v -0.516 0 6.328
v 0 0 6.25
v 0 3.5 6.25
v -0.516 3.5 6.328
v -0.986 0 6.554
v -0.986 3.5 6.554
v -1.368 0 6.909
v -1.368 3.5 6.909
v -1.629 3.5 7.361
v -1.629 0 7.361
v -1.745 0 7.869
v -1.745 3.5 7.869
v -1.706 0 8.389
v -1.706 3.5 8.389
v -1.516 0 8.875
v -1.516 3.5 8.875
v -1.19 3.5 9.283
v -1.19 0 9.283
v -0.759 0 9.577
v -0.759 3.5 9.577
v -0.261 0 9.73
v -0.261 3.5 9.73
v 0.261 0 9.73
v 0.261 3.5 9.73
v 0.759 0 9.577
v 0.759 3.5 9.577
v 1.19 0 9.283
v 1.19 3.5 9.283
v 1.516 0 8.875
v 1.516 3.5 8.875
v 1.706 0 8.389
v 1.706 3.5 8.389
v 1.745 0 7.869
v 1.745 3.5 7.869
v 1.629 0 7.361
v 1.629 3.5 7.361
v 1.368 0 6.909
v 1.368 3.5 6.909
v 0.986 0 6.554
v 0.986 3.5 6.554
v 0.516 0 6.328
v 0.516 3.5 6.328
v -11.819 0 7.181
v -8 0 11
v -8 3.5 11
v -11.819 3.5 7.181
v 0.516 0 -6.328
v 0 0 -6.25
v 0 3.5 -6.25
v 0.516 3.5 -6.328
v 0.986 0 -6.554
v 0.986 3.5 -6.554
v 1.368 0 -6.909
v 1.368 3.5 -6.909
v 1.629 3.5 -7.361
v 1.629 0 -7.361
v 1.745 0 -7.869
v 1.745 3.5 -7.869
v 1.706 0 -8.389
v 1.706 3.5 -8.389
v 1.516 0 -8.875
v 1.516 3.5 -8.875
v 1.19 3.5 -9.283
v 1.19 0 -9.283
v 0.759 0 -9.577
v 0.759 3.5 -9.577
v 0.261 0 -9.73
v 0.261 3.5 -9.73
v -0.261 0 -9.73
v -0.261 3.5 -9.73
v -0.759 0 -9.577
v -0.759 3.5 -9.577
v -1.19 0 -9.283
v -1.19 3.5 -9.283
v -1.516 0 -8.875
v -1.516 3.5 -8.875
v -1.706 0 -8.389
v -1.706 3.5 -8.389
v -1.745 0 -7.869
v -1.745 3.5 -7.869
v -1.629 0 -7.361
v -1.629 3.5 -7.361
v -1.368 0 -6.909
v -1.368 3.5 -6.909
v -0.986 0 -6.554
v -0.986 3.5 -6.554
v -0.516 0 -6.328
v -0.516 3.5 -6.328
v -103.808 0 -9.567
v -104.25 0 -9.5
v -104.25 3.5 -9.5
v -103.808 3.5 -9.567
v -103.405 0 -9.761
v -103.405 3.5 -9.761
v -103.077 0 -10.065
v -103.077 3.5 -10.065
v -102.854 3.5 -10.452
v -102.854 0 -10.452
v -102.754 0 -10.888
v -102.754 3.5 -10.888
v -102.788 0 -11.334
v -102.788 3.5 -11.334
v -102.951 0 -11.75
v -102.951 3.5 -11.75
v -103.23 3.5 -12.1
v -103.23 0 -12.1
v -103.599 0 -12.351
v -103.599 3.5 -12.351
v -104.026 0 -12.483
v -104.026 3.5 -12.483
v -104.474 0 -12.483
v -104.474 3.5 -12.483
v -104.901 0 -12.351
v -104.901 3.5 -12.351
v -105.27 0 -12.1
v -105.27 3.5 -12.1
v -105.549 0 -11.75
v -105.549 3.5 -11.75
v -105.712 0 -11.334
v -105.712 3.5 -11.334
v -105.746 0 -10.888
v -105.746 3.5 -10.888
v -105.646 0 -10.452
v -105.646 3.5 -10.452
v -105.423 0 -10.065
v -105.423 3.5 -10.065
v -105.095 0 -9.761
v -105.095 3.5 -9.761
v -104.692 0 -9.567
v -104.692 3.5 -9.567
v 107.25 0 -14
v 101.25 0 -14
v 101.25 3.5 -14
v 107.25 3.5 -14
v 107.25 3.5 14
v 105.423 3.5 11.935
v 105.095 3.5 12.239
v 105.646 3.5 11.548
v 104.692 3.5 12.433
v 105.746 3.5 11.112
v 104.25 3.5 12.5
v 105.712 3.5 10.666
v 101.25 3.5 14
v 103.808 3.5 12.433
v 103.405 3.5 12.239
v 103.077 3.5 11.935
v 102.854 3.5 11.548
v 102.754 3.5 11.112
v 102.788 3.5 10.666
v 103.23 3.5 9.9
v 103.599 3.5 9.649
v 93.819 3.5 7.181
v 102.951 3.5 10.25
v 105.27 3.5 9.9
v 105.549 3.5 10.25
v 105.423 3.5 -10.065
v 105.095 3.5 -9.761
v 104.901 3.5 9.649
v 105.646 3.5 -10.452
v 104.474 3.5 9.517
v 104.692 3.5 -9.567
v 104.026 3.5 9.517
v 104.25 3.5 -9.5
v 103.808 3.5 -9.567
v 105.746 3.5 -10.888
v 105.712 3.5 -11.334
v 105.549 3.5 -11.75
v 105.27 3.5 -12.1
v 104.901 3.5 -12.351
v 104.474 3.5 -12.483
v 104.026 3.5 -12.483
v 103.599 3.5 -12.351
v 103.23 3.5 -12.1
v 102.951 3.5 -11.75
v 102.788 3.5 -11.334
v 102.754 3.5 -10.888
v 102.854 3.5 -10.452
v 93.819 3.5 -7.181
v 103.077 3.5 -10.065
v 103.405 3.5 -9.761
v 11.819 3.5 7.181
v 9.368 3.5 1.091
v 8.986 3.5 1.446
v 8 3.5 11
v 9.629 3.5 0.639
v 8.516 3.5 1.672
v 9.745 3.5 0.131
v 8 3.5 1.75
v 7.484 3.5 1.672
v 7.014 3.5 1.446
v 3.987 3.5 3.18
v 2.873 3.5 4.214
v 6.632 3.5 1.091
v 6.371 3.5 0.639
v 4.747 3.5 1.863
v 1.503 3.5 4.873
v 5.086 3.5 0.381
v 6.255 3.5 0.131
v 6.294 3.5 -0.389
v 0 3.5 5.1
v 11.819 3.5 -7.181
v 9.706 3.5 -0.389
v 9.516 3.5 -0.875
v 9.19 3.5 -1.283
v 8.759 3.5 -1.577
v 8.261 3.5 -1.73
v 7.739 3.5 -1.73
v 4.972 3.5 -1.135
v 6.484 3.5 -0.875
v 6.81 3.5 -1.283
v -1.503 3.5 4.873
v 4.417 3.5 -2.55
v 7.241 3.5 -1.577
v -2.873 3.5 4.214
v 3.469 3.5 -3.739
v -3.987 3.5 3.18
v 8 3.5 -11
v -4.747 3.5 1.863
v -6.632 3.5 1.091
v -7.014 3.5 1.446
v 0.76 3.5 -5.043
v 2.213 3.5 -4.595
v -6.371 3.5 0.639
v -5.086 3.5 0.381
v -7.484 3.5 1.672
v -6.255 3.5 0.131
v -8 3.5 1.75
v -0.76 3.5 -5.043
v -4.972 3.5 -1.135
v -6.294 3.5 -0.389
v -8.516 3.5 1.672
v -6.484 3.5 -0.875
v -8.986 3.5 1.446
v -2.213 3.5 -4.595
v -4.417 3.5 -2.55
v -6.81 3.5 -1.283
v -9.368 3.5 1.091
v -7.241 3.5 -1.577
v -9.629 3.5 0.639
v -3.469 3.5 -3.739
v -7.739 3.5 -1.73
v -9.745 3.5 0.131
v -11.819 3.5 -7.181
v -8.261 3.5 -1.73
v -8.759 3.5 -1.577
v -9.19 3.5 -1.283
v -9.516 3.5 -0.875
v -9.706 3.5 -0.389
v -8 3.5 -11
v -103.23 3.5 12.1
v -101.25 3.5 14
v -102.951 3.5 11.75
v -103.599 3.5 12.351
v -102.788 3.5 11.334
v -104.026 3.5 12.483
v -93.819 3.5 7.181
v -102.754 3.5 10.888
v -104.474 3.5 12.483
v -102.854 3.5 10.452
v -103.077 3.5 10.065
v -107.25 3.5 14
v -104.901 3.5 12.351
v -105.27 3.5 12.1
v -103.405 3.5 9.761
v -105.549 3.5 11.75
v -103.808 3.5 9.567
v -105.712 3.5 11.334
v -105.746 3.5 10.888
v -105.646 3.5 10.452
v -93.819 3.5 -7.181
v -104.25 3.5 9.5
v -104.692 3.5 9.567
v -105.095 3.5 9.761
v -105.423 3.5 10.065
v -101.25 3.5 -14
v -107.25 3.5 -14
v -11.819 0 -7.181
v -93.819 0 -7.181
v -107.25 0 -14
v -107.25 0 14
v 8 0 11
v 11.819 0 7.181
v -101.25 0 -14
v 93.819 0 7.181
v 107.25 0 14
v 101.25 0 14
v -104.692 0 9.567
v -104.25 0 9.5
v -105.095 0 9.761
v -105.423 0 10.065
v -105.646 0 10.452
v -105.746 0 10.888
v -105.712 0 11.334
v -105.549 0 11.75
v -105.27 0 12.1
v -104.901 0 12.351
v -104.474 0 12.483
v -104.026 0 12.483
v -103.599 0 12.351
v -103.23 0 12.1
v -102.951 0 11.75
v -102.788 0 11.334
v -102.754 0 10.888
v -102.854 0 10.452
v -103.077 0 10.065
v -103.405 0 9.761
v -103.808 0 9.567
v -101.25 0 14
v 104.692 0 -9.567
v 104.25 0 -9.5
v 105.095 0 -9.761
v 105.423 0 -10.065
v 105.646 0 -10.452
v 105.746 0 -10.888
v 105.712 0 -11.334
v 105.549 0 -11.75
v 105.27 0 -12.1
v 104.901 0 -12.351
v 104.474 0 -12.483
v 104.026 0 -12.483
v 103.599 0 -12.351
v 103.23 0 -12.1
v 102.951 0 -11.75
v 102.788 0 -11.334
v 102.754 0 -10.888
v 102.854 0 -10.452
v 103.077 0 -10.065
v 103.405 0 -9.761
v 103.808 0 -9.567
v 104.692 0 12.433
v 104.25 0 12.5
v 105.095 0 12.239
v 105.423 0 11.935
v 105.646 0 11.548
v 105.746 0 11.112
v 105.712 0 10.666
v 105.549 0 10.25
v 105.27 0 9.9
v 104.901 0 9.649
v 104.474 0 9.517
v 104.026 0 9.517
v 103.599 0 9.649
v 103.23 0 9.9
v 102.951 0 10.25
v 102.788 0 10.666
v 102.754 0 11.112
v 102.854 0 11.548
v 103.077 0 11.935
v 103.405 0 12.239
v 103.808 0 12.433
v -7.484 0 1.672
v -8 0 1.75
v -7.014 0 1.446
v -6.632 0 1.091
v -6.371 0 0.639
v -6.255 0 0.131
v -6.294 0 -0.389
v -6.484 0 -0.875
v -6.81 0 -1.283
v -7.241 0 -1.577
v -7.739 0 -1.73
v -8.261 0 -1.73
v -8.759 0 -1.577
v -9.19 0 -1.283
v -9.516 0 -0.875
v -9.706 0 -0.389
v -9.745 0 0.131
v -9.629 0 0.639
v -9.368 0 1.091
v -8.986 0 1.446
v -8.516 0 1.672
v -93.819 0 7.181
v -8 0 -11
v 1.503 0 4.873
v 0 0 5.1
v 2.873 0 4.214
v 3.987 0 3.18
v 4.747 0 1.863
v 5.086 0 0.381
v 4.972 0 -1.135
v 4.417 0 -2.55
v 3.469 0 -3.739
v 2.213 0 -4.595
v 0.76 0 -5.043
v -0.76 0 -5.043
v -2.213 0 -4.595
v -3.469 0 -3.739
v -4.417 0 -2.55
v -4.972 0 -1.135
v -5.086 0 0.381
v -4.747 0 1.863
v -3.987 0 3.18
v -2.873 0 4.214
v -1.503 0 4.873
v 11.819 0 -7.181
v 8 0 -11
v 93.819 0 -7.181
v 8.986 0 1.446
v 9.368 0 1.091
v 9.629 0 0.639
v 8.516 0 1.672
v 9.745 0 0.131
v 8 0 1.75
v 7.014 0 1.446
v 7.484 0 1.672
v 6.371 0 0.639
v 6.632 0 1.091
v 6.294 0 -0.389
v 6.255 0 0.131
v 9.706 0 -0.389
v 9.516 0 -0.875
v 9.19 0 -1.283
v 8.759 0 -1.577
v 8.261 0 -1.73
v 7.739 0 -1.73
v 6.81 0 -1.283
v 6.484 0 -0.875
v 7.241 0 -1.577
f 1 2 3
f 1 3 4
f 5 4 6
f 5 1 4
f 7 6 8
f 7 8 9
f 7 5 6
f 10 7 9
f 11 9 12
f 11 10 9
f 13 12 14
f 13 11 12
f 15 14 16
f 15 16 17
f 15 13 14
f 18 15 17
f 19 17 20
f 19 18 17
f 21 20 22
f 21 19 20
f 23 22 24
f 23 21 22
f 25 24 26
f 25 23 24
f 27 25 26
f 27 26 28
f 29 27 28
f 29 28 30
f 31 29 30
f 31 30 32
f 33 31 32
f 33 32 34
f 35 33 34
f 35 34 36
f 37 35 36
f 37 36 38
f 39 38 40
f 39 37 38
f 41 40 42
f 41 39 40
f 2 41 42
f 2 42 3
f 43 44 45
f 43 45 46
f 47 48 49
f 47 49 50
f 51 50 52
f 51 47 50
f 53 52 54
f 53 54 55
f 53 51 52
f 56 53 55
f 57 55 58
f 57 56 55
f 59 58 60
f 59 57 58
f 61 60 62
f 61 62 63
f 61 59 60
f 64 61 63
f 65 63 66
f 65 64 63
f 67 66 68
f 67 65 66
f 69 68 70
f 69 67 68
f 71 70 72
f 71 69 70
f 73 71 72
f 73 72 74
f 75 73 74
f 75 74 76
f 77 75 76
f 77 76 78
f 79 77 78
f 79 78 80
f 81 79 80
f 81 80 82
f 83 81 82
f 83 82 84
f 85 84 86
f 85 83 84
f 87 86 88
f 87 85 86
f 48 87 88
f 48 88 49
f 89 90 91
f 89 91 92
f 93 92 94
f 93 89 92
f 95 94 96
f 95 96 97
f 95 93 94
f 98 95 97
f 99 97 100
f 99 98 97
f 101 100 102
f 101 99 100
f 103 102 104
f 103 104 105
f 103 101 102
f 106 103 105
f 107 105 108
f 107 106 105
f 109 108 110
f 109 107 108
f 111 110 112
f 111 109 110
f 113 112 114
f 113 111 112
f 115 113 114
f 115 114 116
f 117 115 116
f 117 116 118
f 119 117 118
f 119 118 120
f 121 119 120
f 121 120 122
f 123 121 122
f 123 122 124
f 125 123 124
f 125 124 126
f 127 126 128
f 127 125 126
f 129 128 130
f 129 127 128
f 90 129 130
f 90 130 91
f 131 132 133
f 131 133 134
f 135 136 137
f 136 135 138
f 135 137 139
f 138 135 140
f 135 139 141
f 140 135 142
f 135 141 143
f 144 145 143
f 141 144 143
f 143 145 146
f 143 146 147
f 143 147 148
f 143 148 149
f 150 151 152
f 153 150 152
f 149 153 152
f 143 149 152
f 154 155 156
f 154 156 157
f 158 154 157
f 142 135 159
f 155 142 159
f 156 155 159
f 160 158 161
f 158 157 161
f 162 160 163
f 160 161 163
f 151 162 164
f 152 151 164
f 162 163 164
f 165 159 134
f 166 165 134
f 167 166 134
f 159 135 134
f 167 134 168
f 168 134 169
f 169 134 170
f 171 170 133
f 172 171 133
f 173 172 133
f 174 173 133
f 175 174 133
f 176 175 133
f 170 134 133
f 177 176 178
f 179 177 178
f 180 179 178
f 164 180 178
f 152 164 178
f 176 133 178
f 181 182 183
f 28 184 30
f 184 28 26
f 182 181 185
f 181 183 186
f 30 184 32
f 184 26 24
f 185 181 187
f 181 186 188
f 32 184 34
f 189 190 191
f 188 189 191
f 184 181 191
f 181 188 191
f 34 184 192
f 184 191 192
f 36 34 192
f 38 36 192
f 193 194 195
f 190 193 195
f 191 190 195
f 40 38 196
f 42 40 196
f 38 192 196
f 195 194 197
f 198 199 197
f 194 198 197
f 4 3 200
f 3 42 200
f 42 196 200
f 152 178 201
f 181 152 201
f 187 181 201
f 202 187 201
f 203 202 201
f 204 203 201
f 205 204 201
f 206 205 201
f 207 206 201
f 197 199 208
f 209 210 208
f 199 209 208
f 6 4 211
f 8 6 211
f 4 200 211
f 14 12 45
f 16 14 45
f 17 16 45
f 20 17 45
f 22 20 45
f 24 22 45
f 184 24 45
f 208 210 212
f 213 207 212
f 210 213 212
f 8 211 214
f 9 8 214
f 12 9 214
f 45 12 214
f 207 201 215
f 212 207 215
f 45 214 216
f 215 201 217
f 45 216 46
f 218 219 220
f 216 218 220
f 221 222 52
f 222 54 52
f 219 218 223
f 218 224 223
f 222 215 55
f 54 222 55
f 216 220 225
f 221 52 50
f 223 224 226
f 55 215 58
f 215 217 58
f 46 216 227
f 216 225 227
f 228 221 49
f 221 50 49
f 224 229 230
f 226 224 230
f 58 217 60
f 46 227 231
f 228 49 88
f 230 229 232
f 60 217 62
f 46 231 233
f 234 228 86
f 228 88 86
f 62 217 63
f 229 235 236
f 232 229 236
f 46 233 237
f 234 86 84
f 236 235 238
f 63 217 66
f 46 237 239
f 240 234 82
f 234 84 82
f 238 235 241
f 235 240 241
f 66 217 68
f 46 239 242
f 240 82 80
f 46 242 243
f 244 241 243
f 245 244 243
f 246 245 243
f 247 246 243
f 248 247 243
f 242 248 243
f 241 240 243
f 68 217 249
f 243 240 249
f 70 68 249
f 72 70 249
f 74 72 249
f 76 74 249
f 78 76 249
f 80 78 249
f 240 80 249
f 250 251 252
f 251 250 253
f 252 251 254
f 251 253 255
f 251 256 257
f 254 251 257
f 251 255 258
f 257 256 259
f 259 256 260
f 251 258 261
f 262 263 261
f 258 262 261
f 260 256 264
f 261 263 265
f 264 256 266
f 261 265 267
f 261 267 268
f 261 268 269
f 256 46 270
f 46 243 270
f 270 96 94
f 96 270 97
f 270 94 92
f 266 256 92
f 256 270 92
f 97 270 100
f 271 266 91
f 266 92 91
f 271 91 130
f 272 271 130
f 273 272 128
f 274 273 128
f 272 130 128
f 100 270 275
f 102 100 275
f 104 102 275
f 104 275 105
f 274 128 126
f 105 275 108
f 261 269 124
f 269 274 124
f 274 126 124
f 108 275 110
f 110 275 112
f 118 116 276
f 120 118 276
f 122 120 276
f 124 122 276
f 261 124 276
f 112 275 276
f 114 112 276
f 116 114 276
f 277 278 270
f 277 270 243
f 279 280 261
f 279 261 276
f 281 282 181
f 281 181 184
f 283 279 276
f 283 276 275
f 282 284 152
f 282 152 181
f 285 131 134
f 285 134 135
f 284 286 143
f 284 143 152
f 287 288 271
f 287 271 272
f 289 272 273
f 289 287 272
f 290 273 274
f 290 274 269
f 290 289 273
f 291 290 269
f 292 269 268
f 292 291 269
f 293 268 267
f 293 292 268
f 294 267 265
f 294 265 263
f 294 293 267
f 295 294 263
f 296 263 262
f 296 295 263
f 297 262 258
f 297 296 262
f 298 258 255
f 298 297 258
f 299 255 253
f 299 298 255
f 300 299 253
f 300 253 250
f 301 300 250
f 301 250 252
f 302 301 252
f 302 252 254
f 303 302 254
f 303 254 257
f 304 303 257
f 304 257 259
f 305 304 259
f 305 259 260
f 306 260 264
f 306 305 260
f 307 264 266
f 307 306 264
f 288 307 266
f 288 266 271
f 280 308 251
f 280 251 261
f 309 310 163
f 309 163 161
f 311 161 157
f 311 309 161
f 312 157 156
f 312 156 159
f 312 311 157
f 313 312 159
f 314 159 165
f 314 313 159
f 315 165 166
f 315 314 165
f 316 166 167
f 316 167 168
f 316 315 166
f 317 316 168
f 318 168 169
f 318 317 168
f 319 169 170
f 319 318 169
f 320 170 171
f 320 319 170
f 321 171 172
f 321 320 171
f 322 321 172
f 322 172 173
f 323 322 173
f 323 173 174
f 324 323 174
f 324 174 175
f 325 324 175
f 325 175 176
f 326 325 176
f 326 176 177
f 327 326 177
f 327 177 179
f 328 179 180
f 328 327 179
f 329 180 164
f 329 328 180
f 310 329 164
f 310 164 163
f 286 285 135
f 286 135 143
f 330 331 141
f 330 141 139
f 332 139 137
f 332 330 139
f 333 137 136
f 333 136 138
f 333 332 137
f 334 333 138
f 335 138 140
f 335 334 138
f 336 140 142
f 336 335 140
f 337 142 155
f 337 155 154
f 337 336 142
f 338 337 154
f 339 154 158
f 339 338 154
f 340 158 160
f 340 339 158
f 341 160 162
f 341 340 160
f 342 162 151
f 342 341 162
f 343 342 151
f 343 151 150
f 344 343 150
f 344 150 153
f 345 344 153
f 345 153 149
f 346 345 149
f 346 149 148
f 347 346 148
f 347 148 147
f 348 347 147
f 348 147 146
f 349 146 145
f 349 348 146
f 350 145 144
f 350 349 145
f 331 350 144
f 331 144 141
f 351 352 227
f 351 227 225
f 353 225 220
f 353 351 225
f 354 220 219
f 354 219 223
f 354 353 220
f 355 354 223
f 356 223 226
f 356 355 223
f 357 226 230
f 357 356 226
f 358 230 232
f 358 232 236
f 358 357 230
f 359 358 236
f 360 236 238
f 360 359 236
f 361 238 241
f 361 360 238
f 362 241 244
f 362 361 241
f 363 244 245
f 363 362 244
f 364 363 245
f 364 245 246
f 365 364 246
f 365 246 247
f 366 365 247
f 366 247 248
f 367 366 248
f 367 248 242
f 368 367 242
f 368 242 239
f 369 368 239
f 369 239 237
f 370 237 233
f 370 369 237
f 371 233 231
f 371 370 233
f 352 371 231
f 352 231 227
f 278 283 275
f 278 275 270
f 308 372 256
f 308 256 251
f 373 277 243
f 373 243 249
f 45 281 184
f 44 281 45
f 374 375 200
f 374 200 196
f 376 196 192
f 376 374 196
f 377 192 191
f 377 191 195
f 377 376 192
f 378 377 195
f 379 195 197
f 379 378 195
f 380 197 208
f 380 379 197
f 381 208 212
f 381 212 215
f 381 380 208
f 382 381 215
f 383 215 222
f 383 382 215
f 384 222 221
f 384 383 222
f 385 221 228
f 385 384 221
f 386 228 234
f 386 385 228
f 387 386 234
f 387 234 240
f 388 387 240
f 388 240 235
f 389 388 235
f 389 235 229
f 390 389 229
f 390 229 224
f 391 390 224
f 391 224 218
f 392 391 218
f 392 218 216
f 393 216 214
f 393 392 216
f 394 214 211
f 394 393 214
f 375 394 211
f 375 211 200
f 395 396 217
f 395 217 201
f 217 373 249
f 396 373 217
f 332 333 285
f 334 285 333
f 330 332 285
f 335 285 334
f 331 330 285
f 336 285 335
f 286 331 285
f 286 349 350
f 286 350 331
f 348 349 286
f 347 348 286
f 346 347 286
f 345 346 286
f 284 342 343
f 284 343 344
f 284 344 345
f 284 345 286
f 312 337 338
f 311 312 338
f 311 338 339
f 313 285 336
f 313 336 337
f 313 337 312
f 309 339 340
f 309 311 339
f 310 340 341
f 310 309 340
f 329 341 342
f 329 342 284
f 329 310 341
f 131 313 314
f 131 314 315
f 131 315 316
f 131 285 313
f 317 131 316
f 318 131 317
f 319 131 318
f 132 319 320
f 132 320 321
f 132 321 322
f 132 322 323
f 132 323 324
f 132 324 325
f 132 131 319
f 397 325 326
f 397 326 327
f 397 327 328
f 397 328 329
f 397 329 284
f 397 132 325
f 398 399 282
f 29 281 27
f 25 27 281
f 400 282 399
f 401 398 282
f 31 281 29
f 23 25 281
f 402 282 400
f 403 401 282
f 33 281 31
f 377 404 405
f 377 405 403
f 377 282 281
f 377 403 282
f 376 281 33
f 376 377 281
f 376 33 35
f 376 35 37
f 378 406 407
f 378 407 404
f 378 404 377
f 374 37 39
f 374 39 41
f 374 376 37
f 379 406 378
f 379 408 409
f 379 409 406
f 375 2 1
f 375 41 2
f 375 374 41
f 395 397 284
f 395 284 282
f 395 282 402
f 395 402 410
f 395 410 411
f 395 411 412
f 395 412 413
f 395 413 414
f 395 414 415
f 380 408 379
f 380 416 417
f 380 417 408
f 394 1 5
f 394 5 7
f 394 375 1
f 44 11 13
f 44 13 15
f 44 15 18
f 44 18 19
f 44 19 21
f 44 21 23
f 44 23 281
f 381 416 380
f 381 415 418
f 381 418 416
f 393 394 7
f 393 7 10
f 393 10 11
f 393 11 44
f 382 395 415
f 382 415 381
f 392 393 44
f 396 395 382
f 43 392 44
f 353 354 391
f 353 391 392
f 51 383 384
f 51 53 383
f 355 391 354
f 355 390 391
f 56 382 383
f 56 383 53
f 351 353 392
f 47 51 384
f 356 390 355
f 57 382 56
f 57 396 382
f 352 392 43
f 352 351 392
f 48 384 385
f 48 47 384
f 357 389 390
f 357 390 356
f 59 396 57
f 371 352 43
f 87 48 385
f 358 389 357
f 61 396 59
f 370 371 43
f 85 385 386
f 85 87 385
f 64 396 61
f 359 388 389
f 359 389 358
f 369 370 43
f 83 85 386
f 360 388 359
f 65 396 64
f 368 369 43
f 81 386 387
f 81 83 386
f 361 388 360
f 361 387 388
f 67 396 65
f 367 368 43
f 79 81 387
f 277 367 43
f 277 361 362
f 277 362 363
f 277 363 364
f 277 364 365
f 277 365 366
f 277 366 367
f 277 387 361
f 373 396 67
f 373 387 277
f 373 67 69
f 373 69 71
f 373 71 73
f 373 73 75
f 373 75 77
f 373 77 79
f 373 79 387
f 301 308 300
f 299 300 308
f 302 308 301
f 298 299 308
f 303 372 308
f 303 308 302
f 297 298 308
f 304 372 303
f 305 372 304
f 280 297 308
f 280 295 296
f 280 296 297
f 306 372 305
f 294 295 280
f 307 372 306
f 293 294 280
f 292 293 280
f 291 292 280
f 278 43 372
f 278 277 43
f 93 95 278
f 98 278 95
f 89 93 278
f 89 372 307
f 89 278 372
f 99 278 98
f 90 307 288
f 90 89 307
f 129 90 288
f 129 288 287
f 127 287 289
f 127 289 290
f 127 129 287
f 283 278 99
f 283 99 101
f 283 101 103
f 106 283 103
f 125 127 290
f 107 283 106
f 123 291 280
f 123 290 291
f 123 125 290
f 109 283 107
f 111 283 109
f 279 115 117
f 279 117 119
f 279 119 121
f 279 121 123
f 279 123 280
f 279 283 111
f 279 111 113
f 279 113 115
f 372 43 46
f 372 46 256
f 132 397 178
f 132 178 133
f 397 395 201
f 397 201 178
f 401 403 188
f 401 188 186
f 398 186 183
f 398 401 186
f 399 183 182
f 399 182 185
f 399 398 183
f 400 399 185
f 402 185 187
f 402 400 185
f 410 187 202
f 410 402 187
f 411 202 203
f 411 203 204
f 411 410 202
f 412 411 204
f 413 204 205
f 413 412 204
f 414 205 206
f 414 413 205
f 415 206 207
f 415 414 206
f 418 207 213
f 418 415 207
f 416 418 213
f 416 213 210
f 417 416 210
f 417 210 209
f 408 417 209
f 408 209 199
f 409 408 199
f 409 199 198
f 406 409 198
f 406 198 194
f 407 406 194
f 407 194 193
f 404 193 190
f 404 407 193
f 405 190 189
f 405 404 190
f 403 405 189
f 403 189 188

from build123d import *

# Parameters (mm, degrees)
SKETCH1_R           = 1.75
SKETCH1_R_2         = 5.1
SKETCH1_R_3         = 1.5
BOSS_EXTRUDE1_DEPTH = 3.5


with BuildPart() as part:
    # Sketch1 → Boss-Extrude1 (new body)
    with BuildSketch(Plane(origin=(0, 0, 0), x_dir=(1, 0, 0), z_dir=(0, 1, 0))):
        Polygon((-93.819210637, 7.180789363), (-11.819210637, 7.180789363), (-8, 11), (8, 11), (11.819210637, 7.180789363), (93.819210637, 7.180789363), (101.25, 14), (107.25, 14), (107.25, -14), (101.25, -14), (93.819210637, -7.180789363), (11.819210637, -7.180789363), (8, -11), (-8, -11), (-11.819210637, -7.180789363), (-93.819210637, -7.180789363), (-101.25, -14), (-107.25, -14), (-107.25, 14), (-101.25, 14), align=None)
        with Locations(Location((-8, 0, 0), (0, 0, 270))):
            Circle(SKETCH1_R, mode=Mode.SUBTRACT)
        with Locations(Location((8, 0, 0), (0, 0, 270))):
            Circle(SKETCH1_R, mode=Mode.SUBTRACT)
        with Locations(Location((0, 0, 0), (0, 0, 270))):
            Circle(SKETCH1_R_2, mode=Mode.SUBTRACT)
        with Locations(Location((-104.25, -11, 0), (0, 0, 90))):
            Circle(SKETCH1_R_3, mode=Mode.SUBTRACT)
        with Locations(Location((0, 8, 0), (0, 0, 270))):
            Circle(SKETCH1_R, mode=Mode.SUBTRACT)
        with Locations(Location((0, -8, 0), (0, 0, 90))):
            Circle(SKETCH1_R, mode=Mode.SUBTRACT)
        with Locations(Location((-104.25, 11, 0), (0, 0, 270))):
            Circle(SKETCH1_R_3, mode=Mode.SUBTRACT)
        with Locations(Location((104.25, 11, 0), (0, 0, 270))):
            Circle(SKETCH1_R_3, mode=Mode.SUBTRACT)
        with Locations(Location((104.25, -11, 0), (0, 0, 270))):
            Circle(SKETCH1_R_3, mode=Mode.SUBTRACT)
    extrude(amount=BOSS_EXTRUDE1_DEPTH)


solid = part.part
